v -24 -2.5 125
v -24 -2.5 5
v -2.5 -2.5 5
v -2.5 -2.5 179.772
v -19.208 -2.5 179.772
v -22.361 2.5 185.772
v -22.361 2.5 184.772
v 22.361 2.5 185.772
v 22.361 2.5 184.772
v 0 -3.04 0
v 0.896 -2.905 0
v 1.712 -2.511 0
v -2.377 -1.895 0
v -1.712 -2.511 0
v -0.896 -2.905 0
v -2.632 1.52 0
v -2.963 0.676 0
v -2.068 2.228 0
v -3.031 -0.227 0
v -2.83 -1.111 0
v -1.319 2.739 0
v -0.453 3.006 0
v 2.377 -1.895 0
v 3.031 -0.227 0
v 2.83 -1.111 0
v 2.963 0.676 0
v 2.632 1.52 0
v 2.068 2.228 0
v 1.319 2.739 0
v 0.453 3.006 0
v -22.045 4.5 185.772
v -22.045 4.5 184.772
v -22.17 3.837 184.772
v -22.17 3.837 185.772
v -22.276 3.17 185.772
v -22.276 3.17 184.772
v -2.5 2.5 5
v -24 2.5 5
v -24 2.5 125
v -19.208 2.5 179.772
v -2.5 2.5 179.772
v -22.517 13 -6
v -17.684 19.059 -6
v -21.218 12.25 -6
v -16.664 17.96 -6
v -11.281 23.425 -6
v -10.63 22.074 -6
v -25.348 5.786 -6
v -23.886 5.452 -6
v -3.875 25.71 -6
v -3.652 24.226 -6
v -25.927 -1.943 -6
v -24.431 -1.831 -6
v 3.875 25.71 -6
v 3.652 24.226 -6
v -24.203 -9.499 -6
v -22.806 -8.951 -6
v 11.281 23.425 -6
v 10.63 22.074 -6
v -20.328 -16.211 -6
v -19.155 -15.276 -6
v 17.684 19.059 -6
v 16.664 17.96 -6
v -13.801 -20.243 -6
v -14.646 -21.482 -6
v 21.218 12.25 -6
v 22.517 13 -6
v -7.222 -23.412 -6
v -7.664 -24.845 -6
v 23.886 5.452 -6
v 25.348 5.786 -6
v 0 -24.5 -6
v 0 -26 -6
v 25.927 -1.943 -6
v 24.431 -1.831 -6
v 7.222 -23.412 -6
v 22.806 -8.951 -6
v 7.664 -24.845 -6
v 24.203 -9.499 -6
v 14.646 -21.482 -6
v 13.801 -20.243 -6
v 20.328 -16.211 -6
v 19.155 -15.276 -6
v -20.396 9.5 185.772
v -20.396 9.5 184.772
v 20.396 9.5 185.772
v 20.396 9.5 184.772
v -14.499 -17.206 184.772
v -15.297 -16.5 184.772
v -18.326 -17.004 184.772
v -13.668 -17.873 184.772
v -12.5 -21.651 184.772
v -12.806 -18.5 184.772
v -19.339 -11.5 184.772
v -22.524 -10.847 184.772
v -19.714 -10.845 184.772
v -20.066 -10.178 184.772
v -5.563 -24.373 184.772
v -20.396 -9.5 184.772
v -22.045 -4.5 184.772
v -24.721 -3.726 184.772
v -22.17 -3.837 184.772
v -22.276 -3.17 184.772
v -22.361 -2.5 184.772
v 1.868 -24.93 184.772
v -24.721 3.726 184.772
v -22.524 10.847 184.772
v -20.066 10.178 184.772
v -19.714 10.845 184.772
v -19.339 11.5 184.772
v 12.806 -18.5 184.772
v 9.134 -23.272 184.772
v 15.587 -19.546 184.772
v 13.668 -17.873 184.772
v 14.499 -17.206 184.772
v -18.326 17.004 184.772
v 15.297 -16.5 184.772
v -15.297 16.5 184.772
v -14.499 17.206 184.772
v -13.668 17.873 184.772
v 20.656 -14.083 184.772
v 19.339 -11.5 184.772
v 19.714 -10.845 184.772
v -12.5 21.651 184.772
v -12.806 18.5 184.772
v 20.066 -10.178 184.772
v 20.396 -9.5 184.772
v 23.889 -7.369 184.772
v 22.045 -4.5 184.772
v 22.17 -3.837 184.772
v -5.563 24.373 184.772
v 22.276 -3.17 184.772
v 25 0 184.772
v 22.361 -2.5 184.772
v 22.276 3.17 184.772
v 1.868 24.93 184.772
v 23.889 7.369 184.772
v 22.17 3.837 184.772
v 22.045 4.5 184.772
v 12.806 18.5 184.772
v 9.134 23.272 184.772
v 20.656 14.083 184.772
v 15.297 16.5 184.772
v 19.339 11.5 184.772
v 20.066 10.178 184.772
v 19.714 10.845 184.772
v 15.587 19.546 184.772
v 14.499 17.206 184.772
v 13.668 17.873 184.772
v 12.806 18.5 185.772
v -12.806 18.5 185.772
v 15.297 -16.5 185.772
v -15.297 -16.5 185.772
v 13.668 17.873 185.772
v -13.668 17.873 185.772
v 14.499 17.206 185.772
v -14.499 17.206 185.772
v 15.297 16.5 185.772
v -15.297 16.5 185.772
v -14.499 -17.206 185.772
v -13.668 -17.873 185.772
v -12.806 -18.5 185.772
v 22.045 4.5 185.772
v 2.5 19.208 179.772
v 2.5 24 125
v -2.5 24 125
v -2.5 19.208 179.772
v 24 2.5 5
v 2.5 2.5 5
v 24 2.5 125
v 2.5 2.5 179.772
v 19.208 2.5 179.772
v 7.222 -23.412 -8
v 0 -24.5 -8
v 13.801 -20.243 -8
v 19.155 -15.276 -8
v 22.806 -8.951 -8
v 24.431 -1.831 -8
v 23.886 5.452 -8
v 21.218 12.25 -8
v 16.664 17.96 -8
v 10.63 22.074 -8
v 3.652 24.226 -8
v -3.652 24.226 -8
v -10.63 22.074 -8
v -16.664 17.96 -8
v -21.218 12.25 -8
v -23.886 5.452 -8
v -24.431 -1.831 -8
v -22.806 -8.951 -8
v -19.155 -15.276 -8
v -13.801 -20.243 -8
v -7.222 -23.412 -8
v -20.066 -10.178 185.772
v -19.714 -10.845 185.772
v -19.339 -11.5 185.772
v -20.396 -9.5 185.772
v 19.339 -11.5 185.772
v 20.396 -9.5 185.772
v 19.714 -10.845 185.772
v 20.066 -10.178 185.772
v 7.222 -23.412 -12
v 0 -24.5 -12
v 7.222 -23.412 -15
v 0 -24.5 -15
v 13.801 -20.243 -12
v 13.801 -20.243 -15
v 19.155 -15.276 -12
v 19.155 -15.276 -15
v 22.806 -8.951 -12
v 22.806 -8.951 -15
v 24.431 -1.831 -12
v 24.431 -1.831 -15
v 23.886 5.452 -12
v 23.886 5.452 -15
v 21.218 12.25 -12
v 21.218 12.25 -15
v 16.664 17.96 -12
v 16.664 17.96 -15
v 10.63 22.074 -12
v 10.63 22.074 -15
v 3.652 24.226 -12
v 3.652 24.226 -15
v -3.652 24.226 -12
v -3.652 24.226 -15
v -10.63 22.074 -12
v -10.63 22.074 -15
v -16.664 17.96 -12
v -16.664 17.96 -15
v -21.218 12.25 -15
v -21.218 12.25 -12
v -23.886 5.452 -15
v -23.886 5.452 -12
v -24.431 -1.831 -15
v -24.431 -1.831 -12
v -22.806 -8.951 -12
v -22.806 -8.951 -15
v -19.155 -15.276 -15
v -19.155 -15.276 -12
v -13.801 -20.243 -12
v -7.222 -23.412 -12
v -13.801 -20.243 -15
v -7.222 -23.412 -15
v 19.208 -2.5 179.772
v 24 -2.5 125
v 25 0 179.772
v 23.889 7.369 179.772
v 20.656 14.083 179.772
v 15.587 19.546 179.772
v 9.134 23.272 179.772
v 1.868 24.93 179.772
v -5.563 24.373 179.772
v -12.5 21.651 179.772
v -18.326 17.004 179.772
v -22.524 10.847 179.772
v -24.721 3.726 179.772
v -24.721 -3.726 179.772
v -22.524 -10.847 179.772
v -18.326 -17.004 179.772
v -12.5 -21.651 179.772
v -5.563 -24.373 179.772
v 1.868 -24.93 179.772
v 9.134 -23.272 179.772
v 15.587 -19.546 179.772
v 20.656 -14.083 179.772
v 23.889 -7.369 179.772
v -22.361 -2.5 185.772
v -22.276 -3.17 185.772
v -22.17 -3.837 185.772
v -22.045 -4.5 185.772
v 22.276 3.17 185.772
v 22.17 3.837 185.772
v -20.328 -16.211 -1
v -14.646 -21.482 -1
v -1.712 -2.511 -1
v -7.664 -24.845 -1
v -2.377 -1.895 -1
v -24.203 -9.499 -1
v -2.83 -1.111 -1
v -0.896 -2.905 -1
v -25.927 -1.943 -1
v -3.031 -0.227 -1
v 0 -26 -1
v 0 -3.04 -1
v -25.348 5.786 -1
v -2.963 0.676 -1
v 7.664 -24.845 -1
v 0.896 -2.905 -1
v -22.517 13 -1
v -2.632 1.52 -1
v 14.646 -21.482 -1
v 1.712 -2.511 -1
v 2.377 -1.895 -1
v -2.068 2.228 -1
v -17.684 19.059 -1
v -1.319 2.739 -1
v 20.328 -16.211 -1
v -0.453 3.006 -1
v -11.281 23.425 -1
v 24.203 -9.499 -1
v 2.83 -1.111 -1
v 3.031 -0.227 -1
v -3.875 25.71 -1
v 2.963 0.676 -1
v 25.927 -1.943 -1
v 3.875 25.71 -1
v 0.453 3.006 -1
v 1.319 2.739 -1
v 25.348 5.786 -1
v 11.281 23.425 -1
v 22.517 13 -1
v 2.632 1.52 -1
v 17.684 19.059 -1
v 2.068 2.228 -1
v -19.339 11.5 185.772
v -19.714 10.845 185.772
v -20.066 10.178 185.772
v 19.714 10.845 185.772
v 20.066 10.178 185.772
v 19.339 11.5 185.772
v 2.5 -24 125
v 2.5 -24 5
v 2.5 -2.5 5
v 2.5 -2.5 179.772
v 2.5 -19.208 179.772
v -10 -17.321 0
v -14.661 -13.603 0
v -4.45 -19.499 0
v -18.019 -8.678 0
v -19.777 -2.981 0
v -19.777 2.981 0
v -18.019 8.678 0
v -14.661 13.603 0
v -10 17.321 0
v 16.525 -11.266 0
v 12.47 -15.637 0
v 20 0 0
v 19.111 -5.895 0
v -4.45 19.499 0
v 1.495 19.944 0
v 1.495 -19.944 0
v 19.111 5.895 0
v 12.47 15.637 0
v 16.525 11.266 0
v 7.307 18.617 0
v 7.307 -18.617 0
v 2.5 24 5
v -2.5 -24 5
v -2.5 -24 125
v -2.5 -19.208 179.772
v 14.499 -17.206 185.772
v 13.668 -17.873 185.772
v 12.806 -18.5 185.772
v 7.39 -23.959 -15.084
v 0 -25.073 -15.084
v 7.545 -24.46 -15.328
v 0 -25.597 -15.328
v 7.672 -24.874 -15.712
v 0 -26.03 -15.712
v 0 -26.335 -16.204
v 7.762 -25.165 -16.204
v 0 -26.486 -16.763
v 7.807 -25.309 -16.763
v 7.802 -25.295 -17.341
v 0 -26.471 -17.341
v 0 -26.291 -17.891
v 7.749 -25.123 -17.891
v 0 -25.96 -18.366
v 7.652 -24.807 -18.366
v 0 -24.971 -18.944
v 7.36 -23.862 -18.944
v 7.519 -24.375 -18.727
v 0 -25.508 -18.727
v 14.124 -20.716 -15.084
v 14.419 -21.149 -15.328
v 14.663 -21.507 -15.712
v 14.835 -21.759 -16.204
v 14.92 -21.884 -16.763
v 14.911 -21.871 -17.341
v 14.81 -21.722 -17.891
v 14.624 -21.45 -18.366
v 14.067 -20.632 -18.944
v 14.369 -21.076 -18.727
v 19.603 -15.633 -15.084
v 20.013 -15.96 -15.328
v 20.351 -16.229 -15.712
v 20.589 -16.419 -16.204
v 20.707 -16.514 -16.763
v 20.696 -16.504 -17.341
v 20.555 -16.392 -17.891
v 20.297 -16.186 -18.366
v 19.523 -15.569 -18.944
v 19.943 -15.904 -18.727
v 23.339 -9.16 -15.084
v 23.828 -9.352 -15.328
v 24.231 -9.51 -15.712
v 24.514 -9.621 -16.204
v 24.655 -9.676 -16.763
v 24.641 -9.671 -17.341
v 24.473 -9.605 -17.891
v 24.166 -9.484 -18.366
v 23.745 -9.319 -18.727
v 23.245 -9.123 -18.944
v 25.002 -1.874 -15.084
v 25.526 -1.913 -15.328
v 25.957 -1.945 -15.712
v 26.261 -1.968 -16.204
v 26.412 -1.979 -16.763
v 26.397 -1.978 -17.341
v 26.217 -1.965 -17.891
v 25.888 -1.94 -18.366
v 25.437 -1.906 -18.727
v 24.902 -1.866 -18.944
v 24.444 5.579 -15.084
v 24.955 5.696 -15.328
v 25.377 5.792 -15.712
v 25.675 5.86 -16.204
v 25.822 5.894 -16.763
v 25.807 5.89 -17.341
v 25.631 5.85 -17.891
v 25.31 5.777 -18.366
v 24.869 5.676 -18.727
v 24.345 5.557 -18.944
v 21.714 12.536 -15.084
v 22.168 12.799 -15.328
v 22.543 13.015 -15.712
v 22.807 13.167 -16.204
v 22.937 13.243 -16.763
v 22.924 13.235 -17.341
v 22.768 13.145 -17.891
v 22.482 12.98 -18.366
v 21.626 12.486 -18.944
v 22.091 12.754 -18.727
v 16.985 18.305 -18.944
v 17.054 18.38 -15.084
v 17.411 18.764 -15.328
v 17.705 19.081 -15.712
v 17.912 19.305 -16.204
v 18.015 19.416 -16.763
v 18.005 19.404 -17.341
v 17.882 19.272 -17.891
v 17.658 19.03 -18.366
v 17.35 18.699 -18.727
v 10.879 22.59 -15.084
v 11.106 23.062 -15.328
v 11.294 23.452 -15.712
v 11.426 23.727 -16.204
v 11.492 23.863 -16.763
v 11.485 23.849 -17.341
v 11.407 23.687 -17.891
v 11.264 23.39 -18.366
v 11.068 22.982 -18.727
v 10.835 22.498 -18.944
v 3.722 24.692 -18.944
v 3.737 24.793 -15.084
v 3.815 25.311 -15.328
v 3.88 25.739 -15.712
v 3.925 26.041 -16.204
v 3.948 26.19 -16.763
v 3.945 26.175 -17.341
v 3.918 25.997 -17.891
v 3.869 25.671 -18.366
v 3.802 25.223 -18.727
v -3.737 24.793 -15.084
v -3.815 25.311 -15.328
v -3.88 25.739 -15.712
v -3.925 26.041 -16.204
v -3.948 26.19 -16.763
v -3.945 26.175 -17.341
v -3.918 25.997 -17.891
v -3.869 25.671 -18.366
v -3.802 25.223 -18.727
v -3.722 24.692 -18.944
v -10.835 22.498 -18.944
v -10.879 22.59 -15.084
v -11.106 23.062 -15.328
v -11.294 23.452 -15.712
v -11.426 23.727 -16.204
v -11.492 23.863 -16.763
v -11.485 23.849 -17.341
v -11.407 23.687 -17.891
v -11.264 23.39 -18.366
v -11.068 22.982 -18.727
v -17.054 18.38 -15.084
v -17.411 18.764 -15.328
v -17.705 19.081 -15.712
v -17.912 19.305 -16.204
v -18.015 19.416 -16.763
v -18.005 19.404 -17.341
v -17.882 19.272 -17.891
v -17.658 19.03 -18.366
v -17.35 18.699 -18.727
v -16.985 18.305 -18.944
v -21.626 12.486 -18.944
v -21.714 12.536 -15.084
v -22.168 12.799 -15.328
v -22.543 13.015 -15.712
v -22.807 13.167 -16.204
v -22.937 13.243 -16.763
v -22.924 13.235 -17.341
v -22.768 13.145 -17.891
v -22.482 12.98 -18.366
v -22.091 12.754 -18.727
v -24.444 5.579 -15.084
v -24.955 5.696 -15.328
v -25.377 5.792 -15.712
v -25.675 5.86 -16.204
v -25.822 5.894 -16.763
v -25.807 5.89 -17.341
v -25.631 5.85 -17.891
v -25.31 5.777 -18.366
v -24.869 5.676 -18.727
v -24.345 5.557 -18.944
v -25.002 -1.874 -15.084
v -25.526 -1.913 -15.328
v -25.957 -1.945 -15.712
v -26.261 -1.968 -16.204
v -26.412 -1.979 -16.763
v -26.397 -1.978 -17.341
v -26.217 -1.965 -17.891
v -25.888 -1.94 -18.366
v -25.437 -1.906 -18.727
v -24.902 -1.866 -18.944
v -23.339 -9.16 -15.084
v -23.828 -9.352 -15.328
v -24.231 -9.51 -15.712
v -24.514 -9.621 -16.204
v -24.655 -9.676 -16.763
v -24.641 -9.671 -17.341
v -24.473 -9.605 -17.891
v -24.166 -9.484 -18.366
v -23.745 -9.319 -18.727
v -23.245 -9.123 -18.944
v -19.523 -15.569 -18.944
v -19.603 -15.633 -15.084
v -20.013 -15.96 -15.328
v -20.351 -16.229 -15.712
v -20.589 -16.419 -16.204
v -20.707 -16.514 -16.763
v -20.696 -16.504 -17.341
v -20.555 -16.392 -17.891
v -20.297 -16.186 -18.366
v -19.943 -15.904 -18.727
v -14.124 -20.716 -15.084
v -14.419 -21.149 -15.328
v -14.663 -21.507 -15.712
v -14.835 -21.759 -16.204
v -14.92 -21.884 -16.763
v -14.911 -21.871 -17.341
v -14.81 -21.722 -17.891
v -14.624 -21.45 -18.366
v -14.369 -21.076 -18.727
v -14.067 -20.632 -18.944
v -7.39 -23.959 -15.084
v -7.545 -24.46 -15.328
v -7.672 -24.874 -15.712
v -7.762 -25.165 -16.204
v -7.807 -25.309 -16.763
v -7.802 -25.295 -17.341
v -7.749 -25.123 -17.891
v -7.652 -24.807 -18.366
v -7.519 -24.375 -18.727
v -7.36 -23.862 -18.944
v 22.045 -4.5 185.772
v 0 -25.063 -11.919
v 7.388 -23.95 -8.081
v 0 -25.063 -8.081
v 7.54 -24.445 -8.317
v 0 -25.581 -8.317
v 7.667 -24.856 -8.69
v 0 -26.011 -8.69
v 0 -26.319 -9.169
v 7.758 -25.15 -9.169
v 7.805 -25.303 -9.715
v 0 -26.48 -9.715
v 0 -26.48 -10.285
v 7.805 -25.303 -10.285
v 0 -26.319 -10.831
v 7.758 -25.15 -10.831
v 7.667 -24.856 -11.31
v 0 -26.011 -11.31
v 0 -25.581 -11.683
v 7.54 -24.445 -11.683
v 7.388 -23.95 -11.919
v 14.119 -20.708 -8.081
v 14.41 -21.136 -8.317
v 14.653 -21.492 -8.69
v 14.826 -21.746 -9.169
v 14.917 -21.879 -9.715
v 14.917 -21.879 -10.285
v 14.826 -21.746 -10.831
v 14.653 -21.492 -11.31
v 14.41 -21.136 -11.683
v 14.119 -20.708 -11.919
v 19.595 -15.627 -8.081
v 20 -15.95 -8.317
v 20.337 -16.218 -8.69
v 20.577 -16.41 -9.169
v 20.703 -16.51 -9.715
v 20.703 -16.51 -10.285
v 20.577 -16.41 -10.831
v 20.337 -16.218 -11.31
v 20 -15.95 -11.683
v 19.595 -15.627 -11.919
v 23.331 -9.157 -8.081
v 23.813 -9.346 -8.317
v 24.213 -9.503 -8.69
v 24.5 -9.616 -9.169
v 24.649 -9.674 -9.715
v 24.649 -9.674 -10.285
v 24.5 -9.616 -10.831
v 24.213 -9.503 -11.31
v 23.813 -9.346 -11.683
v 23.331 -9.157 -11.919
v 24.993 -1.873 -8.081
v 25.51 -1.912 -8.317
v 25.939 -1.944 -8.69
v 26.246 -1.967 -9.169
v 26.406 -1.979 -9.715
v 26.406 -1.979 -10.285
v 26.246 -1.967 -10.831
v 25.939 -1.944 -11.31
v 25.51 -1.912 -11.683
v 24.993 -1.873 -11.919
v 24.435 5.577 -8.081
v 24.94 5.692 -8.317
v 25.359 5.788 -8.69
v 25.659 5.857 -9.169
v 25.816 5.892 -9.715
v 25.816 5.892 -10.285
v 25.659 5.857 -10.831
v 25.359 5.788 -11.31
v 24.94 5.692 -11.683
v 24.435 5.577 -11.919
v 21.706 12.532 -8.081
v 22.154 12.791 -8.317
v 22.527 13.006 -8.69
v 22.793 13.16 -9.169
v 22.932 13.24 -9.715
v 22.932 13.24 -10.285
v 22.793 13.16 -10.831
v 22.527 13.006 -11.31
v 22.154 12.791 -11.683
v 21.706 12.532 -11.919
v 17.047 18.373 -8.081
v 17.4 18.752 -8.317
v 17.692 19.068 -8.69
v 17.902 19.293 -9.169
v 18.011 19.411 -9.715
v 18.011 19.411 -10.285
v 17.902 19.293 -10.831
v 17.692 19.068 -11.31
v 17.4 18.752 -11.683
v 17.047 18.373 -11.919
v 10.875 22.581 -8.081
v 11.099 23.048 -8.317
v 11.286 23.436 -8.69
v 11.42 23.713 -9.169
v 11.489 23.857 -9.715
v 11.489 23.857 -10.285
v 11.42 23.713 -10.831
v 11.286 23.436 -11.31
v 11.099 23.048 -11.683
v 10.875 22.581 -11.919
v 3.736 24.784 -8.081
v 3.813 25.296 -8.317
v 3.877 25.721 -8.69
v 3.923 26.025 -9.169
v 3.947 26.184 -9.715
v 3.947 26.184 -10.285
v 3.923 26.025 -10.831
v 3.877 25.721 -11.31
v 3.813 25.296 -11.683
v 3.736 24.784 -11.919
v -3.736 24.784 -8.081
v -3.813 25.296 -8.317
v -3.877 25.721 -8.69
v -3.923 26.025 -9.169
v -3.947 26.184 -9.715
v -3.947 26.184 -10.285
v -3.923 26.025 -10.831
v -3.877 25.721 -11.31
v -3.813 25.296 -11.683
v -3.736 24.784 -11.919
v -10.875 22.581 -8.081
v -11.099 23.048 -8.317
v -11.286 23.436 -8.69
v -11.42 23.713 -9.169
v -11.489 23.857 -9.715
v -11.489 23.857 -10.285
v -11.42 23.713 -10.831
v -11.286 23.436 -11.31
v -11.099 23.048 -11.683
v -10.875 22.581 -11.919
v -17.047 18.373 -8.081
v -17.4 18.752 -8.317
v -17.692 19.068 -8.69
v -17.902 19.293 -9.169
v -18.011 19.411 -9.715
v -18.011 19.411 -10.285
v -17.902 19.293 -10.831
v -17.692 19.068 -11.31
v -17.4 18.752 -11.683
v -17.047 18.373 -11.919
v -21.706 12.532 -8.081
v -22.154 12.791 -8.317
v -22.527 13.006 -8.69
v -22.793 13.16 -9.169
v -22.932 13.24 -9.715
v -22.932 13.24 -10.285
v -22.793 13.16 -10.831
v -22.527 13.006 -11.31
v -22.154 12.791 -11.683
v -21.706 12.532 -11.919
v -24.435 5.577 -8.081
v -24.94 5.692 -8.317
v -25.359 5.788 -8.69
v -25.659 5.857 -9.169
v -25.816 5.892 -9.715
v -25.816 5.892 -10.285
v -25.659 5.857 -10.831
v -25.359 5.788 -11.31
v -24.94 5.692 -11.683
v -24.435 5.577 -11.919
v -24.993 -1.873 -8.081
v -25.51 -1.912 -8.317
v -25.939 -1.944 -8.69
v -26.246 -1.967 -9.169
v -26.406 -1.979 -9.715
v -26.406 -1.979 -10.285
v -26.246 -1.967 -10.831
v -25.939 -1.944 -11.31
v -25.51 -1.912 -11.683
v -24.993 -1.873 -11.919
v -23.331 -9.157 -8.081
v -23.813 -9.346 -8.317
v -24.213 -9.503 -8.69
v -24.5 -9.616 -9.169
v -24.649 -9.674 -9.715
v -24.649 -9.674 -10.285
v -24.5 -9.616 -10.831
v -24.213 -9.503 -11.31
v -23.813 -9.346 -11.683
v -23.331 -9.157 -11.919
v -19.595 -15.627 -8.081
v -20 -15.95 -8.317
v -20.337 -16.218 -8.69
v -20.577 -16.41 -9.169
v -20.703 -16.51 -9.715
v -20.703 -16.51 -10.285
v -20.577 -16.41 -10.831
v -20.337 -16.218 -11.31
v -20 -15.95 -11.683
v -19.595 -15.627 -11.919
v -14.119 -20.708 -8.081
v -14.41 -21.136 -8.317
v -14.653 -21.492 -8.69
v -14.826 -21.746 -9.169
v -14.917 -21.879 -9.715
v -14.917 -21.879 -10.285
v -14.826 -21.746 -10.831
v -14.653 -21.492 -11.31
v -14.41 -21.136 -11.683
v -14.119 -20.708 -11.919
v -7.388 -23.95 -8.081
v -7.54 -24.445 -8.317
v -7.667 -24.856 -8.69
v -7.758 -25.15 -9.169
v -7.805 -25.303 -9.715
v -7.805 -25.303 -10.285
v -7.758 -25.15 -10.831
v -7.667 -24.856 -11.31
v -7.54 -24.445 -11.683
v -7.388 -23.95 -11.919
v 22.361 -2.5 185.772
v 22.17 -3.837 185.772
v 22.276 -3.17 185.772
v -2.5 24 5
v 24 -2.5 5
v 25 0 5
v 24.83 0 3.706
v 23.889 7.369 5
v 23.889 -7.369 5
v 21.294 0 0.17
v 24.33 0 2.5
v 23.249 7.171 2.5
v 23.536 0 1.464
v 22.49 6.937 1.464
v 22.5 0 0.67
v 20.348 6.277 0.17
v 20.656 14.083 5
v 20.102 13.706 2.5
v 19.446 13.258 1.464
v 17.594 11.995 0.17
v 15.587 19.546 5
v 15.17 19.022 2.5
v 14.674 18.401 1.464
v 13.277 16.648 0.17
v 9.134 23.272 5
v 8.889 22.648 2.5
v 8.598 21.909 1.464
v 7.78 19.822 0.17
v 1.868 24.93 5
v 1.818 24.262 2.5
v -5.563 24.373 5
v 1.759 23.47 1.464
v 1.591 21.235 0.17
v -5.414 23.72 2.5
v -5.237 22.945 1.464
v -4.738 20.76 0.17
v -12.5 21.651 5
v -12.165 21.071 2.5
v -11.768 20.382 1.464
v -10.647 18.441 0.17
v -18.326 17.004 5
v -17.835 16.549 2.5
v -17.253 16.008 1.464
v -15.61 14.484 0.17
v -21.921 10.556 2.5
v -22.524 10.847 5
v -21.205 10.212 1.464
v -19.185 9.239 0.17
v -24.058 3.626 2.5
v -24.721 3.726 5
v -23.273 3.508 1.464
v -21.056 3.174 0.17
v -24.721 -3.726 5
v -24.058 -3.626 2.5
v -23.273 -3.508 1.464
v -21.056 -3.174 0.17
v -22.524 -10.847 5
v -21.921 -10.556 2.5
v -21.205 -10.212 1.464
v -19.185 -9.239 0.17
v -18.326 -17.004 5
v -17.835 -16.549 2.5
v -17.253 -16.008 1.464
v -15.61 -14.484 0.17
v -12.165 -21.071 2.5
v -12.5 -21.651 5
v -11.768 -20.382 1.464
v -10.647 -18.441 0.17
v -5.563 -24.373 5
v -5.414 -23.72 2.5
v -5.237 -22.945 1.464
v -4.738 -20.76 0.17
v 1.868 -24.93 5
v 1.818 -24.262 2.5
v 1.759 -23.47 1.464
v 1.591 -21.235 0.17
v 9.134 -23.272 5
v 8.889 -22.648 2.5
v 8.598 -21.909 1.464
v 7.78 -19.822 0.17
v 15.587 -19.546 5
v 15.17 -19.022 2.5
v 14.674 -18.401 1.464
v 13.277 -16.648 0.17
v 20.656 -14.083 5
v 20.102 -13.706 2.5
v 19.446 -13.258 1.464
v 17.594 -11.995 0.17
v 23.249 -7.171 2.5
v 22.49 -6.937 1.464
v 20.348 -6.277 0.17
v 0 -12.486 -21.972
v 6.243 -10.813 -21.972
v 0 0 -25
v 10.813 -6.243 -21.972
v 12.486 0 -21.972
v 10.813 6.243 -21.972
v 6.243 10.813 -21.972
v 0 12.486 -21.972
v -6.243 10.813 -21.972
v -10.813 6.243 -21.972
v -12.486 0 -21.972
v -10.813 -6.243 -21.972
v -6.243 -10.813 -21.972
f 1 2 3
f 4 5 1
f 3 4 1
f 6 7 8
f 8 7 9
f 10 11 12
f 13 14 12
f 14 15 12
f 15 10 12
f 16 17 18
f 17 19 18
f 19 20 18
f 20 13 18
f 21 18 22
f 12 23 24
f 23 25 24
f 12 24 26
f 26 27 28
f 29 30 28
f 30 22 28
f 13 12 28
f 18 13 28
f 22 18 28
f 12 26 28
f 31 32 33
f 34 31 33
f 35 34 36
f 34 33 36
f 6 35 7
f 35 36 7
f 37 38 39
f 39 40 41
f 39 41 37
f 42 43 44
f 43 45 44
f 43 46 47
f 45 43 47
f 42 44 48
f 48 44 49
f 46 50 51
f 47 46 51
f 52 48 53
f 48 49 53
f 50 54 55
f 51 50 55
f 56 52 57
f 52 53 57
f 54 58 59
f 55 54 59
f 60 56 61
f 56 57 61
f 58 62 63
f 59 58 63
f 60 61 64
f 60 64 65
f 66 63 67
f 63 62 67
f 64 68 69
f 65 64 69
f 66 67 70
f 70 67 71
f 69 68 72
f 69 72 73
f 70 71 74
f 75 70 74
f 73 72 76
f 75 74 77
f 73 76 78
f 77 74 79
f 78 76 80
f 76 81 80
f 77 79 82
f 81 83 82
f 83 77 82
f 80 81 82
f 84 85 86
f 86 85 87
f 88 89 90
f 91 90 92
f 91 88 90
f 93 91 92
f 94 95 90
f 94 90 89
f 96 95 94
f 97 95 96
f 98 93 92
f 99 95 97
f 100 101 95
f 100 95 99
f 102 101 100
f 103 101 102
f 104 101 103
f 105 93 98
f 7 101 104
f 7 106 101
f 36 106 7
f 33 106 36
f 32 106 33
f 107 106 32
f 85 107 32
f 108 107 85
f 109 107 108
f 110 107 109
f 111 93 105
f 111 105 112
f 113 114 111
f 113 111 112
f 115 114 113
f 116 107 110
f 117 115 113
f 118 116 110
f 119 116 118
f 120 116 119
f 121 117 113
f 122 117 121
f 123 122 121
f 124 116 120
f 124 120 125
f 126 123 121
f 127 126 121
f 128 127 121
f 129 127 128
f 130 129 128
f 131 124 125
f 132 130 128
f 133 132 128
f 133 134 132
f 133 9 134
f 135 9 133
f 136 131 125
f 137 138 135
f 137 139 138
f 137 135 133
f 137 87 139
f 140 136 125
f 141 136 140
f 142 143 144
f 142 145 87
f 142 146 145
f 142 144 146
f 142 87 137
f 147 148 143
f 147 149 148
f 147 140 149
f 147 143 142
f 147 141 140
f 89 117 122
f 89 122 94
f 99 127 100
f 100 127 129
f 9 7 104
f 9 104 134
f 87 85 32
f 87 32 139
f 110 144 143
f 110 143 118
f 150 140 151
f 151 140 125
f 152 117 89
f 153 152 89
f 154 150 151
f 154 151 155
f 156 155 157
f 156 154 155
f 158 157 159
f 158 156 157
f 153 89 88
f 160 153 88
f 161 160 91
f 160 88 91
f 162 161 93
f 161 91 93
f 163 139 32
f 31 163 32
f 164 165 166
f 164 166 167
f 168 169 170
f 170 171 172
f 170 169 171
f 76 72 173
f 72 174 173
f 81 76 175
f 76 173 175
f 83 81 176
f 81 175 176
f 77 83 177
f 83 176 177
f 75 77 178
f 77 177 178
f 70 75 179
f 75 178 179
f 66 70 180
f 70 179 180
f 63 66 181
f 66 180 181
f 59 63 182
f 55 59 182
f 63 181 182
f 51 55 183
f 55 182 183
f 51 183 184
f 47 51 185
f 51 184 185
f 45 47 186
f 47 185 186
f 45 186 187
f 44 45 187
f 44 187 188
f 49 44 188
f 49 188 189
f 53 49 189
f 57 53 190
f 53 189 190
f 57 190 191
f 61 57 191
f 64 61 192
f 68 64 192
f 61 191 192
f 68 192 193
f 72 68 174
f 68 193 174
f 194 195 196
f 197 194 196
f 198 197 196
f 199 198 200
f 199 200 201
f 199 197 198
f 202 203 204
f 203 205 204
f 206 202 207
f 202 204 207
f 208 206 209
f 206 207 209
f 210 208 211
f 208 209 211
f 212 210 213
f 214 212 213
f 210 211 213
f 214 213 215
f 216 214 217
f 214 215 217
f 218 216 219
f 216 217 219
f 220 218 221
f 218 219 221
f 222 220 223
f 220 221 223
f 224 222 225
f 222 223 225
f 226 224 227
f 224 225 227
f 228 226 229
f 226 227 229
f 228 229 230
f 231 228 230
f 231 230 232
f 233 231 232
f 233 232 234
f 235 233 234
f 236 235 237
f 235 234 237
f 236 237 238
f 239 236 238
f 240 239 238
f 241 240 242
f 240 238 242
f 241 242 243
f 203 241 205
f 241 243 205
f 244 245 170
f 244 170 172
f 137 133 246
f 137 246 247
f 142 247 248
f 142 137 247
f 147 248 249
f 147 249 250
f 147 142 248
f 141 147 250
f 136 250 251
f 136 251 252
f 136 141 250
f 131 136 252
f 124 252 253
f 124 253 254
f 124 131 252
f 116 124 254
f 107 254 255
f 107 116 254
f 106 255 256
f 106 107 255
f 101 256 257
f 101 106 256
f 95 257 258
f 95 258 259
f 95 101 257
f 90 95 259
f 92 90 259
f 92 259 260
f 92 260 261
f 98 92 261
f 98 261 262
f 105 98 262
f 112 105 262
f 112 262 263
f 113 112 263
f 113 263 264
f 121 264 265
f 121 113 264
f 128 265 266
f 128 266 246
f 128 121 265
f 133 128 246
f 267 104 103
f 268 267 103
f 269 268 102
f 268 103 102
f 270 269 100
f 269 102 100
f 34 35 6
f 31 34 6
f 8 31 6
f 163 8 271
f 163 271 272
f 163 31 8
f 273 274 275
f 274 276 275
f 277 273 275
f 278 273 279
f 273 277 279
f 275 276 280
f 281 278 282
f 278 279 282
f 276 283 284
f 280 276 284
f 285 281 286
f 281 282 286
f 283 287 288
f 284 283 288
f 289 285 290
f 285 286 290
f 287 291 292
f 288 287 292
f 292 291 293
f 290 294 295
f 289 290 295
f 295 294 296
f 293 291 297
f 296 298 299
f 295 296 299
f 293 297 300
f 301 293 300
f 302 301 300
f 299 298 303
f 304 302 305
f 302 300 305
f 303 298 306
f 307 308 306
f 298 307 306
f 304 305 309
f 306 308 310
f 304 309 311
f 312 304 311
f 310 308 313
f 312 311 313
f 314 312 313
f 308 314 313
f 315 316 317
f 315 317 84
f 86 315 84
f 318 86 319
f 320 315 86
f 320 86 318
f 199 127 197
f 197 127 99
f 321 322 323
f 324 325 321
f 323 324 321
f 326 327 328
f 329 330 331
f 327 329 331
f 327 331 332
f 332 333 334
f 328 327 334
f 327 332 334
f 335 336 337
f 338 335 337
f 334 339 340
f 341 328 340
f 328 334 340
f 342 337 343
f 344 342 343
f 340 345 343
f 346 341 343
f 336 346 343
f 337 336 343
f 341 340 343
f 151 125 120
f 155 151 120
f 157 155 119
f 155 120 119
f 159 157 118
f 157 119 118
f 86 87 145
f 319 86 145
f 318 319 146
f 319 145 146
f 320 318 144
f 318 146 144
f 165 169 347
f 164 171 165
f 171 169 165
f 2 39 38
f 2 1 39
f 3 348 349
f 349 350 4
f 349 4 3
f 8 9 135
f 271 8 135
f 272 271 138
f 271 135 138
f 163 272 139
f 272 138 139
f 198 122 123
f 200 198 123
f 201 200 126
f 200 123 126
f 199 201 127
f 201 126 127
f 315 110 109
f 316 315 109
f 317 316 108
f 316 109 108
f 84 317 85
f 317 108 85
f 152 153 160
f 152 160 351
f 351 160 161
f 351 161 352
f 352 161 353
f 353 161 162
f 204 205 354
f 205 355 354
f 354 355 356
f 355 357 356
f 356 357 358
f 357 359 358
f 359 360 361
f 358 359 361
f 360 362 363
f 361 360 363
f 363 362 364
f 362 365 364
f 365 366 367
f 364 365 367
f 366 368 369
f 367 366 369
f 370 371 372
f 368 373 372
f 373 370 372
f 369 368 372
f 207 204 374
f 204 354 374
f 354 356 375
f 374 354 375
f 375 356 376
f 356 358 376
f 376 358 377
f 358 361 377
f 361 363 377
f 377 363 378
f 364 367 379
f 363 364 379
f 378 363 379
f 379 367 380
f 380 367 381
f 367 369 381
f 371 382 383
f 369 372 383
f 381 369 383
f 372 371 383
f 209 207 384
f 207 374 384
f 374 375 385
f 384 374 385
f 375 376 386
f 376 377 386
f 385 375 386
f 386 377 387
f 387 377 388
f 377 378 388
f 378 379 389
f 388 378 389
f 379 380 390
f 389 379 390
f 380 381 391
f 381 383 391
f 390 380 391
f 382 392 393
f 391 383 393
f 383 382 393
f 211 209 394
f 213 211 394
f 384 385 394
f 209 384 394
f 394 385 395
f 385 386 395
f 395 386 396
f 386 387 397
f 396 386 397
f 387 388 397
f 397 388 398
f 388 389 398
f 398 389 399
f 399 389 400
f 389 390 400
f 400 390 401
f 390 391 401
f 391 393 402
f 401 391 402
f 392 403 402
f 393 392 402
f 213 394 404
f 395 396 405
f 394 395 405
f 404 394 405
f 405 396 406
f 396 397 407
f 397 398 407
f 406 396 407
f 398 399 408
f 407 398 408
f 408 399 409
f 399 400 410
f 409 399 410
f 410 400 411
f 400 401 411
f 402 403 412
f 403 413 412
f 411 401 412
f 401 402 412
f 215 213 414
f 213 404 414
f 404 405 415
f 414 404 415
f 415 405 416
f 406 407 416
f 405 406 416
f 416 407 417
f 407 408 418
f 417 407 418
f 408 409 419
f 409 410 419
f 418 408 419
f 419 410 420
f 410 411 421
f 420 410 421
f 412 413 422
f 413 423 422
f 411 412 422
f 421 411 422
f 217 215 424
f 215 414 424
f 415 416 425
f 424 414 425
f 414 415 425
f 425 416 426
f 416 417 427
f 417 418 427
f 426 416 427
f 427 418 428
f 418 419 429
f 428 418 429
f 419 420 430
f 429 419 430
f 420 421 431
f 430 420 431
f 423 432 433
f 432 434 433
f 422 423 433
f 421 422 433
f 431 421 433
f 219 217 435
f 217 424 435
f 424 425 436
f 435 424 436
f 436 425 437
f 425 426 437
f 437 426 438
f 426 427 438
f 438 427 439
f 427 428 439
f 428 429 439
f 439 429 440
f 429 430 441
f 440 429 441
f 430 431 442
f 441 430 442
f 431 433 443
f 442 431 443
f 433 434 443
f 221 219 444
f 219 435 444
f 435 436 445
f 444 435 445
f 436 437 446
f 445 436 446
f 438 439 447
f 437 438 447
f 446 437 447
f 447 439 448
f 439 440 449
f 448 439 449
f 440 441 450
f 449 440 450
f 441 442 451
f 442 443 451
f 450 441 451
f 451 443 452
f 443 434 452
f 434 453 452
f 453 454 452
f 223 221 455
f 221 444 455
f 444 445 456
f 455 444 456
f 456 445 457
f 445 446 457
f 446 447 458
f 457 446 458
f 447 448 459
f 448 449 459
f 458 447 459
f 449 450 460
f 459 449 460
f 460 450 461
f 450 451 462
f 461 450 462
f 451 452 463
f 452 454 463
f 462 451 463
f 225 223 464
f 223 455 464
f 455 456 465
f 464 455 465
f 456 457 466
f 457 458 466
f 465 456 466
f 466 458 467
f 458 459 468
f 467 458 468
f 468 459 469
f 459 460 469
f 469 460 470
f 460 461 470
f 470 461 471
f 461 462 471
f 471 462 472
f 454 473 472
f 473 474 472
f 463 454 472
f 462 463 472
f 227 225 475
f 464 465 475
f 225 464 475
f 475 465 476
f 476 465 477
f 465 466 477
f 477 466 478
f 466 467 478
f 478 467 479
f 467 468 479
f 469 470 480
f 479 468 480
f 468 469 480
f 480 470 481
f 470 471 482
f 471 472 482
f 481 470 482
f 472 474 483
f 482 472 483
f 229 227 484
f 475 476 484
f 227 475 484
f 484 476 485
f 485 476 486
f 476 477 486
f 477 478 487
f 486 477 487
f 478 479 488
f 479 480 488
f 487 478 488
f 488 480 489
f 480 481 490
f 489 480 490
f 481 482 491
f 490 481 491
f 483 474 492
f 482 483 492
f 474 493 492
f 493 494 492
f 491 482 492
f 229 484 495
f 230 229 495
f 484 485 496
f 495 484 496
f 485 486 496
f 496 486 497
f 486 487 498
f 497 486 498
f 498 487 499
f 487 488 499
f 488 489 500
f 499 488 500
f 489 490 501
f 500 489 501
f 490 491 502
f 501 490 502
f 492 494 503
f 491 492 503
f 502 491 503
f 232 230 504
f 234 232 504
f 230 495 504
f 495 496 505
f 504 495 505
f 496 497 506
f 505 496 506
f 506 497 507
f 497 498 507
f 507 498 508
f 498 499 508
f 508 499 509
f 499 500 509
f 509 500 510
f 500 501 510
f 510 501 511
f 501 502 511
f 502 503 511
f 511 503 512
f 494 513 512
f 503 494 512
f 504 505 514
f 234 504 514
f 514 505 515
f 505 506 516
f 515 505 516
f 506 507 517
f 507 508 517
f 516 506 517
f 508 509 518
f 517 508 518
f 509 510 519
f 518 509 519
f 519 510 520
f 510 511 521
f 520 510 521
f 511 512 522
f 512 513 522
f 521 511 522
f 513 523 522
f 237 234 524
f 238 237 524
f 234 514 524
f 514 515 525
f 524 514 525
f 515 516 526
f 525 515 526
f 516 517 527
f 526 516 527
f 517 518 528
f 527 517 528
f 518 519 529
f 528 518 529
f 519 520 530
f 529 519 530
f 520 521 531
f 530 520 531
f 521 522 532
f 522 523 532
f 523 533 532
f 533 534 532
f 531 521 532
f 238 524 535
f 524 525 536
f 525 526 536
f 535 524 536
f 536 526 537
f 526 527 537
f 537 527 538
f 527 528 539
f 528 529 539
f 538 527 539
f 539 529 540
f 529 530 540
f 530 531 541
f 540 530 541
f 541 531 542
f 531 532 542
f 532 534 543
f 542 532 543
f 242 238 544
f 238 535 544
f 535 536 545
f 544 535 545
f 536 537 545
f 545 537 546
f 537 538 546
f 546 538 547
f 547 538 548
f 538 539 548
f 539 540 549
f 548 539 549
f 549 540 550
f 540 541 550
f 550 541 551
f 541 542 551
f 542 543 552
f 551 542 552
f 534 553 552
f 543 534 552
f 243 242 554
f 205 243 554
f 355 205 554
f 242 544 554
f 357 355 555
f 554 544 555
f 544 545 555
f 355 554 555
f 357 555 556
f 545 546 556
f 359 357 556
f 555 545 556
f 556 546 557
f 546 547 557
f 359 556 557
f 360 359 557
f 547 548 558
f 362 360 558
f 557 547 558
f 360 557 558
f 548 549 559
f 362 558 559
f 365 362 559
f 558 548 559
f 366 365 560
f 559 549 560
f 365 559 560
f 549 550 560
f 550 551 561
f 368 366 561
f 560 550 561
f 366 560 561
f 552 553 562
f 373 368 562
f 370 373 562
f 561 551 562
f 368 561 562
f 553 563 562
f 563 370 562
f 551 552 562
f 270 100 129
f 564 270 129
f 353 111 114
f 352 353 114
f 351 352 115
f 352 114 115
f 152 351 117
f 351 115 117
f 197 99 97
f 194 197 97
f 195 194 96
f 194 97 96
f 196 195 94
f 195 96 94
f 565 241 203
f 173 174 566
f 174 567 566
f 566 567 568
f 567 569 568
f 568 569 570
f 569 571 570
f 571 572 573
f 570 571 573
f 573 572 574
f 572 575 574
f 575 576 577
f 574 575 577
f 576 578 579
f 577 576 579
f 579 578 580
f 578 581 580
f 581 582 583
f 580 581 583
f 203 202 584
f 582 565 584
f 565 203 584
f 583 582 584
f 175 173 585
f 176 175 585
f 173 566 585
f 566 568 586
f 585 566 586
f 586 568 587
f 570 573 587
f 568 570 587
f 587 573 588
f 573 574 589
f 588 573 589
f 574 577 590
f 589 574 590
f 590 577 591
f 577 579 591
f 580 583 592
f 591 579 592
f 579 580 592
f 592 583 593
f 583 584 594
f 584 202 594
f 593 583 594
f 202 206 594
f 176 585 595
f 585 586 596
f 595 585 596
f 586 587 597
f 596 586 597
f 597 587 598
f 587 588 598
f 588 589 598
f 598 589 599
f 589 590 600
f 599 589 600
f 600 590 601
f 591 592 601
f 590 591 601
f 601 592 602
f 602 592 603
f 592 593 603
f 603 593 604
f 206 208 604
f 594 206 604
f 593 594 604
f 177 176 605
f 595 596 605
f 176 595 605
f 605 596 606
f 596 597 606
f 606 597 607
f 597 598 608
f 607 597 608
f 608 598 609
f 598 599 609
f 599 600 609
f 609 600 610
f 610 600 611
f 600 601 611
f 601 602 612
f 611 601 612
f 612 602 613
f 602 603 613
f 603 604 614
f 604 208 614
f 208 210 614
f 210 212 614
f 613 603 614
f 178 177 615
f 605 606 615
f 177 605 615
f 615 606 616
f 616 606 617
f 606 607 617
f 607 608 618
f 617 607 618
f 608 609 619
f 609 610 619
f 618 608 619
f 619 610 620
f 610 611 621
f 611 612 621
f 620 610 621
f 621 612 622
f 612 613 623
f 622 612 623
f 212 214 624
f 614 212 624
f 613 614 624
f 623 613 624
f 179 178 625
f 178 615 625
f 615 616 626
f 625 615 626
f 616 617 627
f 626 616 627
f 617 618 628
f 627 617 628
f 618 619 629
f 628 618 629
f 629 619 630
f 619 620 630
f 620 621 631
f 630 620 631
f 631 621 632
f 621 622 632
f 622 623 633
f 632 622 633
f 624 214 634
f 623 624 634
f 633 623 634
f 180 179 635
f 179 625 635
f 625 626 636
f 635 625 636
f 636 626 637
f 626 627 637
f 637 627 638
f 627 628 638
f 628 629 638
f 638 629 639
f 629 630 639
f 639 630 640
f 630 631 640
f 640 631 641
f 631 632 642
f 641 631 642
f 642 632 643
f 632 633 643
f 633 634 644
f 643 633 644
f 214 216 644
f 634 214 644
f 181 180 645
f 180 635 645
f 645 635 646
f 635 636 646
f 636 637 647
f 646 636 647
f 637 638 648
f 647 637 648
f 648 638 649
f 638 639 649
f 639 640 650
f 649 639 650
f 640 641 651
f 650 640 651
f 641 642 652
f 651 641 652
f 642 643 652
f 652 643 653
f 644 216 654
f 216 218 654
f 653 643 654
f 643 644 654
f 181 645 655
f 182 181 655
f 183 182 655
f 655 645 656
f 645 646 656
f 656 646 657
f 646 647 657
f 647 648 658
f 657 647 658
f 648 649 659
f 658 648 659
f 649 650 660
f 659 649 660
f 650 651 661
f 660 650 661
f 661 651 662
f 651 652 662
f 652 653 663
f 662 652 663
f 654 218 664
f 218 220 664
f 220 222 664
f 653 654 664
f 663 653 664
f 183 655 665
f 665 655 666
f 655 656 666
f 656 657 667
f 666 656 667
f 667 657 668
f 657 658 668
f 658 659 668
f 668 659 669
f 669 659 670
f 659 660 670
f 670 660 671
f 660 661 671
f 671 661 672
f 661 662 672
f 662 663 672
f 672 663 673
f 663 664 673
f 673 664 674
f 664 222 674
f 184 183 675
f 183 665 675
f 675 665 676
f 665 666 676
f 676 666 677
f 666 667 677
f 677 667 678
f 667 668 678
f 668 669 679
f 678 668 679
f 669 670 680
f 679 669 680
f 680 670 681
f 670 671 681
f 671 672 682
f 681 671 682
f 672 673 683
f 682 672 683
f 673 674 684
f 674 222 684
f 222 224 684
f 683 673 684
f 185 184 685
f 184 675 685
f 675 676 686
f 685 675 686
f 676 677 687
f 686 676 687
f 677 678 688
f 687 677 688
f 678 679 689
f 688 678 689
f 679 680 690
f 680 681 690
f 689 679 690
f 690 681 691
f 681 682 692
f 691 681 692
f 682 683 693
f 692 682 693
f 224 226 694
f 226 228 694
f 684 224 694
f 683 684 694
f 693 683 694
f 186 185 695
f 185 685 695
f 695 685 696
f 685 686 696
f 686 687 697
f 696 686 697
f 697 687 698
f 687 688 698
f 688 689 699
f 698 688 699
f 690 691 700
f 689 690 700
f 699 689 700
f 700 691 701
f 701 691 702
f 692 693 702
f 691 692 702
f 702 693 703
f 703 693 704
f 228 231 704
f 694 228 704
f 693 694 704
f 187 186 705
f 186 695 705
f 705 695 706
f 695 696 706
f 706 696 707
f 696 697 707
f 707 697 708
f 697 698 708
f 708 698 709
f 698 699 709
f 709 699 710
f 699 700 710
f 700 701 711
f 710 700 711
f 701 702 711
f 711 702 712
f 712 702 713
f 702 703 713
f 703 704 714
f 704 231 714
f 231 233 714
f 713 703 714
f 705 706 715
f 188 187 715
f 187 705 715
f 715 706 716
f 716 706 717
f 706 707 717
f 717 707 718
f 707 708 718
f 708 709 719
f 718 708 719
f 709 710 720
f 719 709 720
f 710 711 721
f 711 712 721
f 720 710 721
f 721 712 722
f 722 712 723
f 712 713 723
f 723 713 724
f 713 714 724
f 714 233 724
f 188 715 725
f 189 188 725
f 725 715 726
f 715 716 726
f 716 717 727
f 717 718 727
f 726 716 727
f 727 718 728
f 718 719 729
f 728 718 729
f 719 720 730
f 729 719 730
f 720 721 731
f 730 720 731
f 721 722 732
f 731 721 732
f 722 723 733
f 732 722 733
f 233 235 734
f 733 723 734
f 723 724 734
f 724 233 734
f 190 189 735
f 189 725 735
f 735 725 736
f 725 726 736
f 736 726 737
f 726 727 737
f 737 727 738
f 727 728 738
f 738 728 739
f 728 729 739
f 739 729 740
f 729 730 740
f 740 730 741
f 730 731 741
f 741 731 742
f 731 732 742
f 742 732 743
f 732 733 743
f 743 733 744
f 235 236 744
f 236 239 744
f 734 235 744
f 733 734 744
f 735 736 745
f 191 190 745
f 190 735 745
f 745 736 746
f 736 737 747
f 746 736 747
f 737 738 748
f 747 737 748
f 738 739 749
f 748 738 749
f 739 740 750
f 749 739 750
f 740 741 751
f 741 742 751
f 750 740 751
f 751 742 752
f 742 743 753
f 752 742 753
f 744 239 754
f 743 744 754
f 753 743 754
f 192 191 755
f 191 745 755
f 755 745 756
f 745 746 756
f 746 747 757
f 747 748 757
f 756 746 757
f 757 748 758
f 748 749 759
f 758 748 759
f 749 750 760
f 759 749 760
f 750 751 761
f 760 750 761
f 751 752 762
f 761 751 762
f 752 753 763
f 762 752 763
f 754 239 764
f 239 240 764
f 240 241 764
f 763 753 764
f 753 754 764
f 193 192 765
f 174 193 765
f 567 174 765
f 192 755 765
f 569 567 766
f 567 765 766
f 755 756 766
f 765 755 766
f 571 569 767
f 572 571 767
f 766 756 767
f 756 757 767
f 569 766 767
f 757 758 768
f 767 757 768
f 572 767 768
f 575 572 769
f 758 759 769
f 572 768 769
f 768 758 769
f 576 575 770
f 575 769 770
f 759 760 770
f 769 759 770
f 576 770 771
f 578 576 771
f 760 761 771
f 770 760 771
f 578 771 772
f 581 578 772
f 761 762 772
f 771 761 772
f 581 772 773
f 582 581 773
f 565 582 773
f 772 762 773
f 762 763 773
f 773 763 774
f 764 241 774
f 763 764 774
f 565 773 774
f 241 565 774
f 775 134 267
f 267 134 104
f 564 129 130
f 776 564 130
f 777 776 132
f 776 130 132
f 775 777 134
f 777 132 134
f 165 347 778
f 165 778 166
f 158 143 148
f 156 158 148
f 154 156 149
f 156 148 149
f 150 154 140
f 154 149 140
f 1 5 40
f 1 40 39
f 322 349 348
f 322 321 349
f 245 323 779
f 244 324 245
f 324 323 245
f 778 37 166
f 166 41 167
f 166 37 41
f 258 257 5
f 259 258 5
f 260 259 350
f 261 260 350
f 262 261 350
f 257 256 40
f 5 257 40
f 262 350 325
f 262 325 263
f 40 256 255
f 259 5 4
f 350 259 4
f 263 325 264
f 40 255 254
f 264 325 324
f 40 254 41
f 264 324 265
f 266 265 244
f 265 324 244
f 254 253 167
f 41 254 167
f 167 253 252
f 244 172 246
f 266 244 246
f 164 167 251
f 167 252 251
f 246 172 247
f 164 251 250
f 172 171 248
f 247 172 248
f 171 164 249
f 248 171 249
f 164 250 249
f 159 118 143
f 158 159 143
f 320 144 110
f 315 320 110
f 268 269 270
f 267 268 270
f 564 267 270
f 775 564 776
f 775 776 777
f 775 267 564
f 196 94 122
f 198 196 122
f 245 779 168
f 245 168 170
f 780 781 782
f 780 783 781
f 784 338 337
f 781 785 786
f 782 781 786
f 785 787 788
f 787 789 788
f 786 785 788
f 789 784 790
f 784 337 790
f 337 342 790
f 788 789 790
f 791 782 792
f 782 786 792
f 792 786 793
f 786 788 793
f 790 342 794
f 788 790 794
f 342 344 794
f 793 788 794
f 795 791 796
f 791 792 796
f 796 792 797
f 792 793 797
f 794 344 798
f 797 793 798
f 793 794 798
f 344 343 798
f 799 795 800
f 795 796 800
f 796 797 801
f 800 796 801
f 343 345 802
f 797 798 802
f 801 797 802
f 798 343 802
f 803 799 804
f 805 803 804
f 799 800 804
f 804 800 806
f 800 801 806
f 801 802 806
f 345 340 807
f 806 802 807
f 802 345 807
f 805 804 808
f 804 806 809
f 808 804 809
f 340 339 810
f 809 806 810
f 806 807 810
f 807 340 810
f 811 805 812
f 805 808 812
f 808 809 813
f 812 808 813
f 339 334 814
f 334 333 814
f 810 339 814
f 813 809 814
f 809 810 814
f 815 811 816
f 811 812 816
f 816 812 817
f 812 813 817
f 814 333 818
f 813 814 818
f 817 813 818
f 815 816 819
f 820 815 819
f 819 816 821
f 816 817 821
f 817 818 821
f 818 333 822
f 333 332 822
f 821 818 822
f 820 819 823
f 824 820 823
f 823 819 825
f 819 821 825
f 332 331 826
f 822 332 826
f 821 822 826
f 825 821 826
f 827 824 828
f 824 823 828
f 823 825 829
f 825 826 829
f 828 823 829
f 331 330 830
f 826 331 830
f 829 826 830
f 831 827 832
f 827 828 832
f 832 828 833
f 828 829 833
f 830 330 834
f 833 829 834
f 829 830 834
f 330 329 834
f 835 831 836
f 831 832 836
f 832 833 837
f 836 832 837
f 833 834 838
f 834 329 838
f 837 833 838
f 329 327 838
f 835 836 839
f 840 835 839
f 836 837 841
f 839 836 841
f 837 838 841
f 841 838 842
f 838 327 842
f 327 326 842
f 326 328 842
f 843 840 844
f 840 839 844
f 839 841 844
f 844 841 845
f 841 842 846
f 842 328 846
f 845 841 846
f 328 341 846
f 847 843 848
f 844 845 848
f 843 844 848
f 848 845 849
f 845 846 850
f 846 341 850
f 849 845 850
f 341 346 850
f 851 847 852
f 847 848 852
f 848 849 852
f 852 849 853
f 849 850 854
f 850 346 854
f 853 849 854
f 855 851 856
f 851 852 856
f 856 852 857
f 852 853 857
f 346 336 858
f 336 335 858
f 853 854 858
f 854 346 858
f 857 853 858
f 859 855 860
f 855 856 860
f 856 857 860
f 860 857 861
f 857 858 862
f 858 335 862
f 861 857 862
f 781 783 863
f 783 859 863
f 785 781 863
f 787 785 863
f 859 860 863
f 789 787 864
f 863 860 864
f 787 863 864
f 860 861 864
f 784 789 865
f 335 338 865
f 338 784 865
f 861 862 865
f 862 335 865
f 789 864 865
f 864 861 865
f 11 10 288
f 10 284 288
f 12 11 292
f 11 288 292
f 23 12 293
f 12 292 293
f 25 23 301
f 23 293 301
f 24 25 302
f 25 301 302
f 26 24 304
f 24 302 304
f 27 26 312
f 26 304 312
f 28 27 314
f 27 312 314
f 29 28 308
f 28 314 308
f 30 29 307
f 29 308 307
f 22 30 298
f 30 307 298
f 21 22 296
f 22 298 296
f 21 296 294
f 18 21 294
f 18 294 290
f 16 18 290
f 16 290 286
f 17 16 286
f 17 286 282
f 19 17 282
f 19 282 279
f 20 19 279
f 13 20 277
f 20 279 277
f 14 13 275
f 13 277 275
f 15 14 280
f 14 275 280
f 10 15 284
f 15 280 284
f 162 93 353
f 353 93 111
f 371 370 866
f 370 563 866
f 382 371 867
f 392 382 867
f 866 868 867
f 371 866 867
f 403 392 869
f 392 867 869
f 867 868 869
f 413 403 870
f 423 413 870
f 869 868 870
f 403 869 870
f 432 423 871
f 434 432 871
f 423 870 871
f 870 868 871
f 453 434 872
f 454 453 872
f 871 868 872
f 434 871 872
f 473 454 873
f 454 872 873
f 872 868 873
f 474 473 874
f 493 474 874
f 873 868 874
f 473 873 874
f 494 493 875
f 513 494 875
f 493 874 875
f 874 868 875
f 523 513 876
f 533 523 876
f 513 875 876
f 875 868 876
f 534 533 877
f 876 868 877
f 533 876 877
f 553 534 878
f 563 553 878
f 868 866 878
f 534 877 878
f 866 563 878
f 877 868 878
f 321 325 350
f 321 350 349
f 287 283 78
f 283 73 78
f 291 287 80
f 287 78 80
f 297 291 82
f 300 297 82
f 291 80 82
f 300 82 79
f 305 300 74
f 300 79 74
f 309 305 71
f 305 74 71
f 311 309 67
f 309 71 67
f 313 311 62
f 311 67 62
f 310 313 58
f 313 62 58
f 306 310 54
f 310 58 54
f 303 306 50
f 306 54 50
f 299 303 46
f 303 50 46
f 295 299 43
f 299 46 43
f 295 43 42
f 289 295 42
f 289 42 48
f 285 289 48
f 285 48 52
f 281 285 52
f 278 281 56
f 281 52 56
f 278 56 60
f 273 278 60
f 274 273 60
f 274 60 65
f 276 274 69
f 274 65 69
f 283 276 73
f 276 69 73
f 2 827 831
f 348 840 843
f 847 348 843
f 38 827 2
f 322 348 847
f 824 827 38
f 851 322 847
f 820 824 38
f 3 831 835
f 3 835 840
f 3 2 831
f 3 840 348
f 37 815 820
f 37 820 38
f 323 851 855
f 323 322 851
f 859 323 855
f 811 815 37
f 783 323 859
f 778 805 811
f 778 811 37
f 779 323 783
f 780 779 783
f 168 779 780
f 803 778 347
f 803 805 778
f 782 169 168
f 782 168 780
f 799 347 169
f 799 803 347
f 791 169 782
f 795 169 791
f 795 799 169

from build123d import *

# Parameters (mm, degrees)
F0_R      = 25
F1_DEPTH  = 5
F3_DEPTH  = 2.5
F5_DEPTH  = 2.5
F6_R      = 25
F7_DEPTH  = 5
F10_R     = 4.99999
F12_DEPTH = 1


# Not quite as in the source:
# - a fillet or chamfer is up to 0.001 mm smaller than in the source, because OpenCascade refuses the exact size


with BuildPart() as f1:
    # F0 (on Top) → F1 (new body)
    with BuildSketch(Plane.XY):
        Circle(F0_R)
    extrude(amount=F1_DEPTH)

    # F2 (on Front) → F3 (join, symmetric)
    with BuildSketch(Plane.XZ):
        Polygon((-24, 125), (-24, 5), (24, 5), (24, 125), (18.7706554351, 184.7716818855), (-18.7706554351, 184.7716818855), align=None)
    extrude(amount=F3_DEPTH, both=True)

    # F4 (on Right) → F5 (join, symmetric)
    with BuildSketch(Plane.YZ):
        Polygon((-24, 125), (-24, 5), (24, 5), (24, 125), (18.7706554351, 184.7716818855), (-18.7706554351, 184.7716818855), align=None)
    extrude(amount=F5_DEPTH, both=True)

    # F6 (on face) → F7 (join)
    with BuildSketch(Plane.XY.offset(184.7716818855)):
        Circle(F6_R)
        Polygon((-2.5, -2.5), (-18.7706554351, -2.5), (-18.7706554351, 2.5), (-2.5, 2.5), (-2.5, 18.7706554351), (2.5, 18.7706554351), (2.5, 2.5), (18.7706554351, 2.5), (18.7706554351, -2.5), (2.5, -2.5), (2.5, -18.7706554351), (-2.5, -18.7706554351), align=None, mode=Mode.SUBTRACT)
    extrude(amount=-F7_DEPTH)

    # F10 (radius 5 in the source; OpenCascade refuses exactly that, so slightly less here)
    f10_edges = [f1.edges().sort_by_distance(p)[0] for p in [
        (-25, 0, 0),
    ]]
    fillet(f10_edges, radius=F10_R)

    # F11 (on face) → F12 (join)
    with BuildSketch(Plane.XY.offset(184.7716818855)):
        with BuildLine():
            ThreePointArc((12.8062484749, -18.5), (14.0871915691, -17.5442592803), (15.2970585408, -16.5))
            Line((15.2970585408, -16.5), (-15.2970585408, -16.5))
            ThreePointArc((-15.2970585408, -16.5), (-14.0871915691, -17.5442592803), (-12.8062484749, -18.5))
            Line((-12.8062484749, -18.5), (12.8062484749, -18.5))
        make_face()
        with BuildLine():
            ThreePointArc((19.3390796058, -11.5), (19.8927295405, -10.5132921309), (20.3960780544, -9.5))
            Line((20.3960780544, -9.5), (-20.3960780544, -9.5))
            ThreePointArc((-20.3960780544, -9.5), (-19.8927295405, -10.5132921309), (-19.3390796058, -11.5))
            Line((-19.3390796058, -11.5), (19.3390796058, -11.5))
        make_face()
        with BuildLine():
            ThreePointArc((22.045407685, -4.5), (22.2255517564, -3.5035480763), (22.360679775, -2.5))
            Line((22.360679775, -2.5), (-22.360679775, -2.5))
            ThreePointArc((-22.360679775, -2.5), (-22.2255517564, -3.5035480763), (-22.045407685, -4.5))
            Line((-22.045407685, -4.5), (22.045407685, -4.5))
        make_face()
        with BuildLine():
            Line((-22.360679775, 2.5), (22.360679775, 2.5))
            ThreePointArc((22.360679775, 2.5), (22.2255517564, 3.5035480763), (22.045407685, 4.5))
            Line((22.045407685, 4.5), (-22.045407685, 4.5))
            ThreePointArc((-22.045407685, 4.5), (-22.2255517564, 3.5035480763), (-22.360679775, 2.5))
        make_face()
        with BuildLine():
            Line((-20.3960780544, 9.5), (20.3960780544, 9.5))
            ThreePointArc((20.3960780544, 9.5), (19.8927295405, 10.5132921309), (19.3390796058, 11.5))
            Line((19.3390796058, 11.5), (-19.3390796058, 11.5))
            ThreePointArc((-19.3390796058, 11.5), (-19.8927295405, 10.5132921309), (-20.3960780544, 9.5))
        make_face()
        with BuildLine():
            Line((-15.2970585408, 16.5), (15.2970585408, 16.5))
            ThreePointArc((15.2970585408, 16.5), (14.0871915691, 17.5442592803), (12.8062484749, 18.5))
            Line((12.8062484749, 18.5), (-12.8062484749, 18.5))
            ThreePointArc((-12.8062484749, 18.5), (-14.0871915691, 17.5442592803), (-15.2970585408, 16.5))
        make_face()
    extrude(amount=F12_DEPTH)


with BuildPart() as f9:
    # F8 (on Right) → F9 (revolve)
    with BuildSketch(Plane.YZ):
        with BuildLine():
            Line((0, -25), (0, 0))
            Line((0, 0), (-3.0396745298, 0))
            Line((-3.0396745298, 0), (-3.0396745298, -1))
            Line((-3.0396745298, -1), (-26, -1))
            Line((-26, -1), (-26, -6))
            Line((-26, -6), (-24.5, -6))
            Line((-24.5, -6), (-24.5, -8))
            ThreePointArc((-24.5, -8), (-26.5, -10), (-24.5, -12))
            Line((-24.5, -12), (-24.5, -15))
            ThreePointArc((-24.5, -15), (-26.4858631671, -16.7626237555), (-24.9713967407, -18.9436525185))
            Line((-24.9713967407, -18.9436525185), (0, -25))
        make_face()
    revolve(axis=Axis((0, 0, -12.5), (0, 0, 1)))


solid = Compound([f1.part, f9.part])
